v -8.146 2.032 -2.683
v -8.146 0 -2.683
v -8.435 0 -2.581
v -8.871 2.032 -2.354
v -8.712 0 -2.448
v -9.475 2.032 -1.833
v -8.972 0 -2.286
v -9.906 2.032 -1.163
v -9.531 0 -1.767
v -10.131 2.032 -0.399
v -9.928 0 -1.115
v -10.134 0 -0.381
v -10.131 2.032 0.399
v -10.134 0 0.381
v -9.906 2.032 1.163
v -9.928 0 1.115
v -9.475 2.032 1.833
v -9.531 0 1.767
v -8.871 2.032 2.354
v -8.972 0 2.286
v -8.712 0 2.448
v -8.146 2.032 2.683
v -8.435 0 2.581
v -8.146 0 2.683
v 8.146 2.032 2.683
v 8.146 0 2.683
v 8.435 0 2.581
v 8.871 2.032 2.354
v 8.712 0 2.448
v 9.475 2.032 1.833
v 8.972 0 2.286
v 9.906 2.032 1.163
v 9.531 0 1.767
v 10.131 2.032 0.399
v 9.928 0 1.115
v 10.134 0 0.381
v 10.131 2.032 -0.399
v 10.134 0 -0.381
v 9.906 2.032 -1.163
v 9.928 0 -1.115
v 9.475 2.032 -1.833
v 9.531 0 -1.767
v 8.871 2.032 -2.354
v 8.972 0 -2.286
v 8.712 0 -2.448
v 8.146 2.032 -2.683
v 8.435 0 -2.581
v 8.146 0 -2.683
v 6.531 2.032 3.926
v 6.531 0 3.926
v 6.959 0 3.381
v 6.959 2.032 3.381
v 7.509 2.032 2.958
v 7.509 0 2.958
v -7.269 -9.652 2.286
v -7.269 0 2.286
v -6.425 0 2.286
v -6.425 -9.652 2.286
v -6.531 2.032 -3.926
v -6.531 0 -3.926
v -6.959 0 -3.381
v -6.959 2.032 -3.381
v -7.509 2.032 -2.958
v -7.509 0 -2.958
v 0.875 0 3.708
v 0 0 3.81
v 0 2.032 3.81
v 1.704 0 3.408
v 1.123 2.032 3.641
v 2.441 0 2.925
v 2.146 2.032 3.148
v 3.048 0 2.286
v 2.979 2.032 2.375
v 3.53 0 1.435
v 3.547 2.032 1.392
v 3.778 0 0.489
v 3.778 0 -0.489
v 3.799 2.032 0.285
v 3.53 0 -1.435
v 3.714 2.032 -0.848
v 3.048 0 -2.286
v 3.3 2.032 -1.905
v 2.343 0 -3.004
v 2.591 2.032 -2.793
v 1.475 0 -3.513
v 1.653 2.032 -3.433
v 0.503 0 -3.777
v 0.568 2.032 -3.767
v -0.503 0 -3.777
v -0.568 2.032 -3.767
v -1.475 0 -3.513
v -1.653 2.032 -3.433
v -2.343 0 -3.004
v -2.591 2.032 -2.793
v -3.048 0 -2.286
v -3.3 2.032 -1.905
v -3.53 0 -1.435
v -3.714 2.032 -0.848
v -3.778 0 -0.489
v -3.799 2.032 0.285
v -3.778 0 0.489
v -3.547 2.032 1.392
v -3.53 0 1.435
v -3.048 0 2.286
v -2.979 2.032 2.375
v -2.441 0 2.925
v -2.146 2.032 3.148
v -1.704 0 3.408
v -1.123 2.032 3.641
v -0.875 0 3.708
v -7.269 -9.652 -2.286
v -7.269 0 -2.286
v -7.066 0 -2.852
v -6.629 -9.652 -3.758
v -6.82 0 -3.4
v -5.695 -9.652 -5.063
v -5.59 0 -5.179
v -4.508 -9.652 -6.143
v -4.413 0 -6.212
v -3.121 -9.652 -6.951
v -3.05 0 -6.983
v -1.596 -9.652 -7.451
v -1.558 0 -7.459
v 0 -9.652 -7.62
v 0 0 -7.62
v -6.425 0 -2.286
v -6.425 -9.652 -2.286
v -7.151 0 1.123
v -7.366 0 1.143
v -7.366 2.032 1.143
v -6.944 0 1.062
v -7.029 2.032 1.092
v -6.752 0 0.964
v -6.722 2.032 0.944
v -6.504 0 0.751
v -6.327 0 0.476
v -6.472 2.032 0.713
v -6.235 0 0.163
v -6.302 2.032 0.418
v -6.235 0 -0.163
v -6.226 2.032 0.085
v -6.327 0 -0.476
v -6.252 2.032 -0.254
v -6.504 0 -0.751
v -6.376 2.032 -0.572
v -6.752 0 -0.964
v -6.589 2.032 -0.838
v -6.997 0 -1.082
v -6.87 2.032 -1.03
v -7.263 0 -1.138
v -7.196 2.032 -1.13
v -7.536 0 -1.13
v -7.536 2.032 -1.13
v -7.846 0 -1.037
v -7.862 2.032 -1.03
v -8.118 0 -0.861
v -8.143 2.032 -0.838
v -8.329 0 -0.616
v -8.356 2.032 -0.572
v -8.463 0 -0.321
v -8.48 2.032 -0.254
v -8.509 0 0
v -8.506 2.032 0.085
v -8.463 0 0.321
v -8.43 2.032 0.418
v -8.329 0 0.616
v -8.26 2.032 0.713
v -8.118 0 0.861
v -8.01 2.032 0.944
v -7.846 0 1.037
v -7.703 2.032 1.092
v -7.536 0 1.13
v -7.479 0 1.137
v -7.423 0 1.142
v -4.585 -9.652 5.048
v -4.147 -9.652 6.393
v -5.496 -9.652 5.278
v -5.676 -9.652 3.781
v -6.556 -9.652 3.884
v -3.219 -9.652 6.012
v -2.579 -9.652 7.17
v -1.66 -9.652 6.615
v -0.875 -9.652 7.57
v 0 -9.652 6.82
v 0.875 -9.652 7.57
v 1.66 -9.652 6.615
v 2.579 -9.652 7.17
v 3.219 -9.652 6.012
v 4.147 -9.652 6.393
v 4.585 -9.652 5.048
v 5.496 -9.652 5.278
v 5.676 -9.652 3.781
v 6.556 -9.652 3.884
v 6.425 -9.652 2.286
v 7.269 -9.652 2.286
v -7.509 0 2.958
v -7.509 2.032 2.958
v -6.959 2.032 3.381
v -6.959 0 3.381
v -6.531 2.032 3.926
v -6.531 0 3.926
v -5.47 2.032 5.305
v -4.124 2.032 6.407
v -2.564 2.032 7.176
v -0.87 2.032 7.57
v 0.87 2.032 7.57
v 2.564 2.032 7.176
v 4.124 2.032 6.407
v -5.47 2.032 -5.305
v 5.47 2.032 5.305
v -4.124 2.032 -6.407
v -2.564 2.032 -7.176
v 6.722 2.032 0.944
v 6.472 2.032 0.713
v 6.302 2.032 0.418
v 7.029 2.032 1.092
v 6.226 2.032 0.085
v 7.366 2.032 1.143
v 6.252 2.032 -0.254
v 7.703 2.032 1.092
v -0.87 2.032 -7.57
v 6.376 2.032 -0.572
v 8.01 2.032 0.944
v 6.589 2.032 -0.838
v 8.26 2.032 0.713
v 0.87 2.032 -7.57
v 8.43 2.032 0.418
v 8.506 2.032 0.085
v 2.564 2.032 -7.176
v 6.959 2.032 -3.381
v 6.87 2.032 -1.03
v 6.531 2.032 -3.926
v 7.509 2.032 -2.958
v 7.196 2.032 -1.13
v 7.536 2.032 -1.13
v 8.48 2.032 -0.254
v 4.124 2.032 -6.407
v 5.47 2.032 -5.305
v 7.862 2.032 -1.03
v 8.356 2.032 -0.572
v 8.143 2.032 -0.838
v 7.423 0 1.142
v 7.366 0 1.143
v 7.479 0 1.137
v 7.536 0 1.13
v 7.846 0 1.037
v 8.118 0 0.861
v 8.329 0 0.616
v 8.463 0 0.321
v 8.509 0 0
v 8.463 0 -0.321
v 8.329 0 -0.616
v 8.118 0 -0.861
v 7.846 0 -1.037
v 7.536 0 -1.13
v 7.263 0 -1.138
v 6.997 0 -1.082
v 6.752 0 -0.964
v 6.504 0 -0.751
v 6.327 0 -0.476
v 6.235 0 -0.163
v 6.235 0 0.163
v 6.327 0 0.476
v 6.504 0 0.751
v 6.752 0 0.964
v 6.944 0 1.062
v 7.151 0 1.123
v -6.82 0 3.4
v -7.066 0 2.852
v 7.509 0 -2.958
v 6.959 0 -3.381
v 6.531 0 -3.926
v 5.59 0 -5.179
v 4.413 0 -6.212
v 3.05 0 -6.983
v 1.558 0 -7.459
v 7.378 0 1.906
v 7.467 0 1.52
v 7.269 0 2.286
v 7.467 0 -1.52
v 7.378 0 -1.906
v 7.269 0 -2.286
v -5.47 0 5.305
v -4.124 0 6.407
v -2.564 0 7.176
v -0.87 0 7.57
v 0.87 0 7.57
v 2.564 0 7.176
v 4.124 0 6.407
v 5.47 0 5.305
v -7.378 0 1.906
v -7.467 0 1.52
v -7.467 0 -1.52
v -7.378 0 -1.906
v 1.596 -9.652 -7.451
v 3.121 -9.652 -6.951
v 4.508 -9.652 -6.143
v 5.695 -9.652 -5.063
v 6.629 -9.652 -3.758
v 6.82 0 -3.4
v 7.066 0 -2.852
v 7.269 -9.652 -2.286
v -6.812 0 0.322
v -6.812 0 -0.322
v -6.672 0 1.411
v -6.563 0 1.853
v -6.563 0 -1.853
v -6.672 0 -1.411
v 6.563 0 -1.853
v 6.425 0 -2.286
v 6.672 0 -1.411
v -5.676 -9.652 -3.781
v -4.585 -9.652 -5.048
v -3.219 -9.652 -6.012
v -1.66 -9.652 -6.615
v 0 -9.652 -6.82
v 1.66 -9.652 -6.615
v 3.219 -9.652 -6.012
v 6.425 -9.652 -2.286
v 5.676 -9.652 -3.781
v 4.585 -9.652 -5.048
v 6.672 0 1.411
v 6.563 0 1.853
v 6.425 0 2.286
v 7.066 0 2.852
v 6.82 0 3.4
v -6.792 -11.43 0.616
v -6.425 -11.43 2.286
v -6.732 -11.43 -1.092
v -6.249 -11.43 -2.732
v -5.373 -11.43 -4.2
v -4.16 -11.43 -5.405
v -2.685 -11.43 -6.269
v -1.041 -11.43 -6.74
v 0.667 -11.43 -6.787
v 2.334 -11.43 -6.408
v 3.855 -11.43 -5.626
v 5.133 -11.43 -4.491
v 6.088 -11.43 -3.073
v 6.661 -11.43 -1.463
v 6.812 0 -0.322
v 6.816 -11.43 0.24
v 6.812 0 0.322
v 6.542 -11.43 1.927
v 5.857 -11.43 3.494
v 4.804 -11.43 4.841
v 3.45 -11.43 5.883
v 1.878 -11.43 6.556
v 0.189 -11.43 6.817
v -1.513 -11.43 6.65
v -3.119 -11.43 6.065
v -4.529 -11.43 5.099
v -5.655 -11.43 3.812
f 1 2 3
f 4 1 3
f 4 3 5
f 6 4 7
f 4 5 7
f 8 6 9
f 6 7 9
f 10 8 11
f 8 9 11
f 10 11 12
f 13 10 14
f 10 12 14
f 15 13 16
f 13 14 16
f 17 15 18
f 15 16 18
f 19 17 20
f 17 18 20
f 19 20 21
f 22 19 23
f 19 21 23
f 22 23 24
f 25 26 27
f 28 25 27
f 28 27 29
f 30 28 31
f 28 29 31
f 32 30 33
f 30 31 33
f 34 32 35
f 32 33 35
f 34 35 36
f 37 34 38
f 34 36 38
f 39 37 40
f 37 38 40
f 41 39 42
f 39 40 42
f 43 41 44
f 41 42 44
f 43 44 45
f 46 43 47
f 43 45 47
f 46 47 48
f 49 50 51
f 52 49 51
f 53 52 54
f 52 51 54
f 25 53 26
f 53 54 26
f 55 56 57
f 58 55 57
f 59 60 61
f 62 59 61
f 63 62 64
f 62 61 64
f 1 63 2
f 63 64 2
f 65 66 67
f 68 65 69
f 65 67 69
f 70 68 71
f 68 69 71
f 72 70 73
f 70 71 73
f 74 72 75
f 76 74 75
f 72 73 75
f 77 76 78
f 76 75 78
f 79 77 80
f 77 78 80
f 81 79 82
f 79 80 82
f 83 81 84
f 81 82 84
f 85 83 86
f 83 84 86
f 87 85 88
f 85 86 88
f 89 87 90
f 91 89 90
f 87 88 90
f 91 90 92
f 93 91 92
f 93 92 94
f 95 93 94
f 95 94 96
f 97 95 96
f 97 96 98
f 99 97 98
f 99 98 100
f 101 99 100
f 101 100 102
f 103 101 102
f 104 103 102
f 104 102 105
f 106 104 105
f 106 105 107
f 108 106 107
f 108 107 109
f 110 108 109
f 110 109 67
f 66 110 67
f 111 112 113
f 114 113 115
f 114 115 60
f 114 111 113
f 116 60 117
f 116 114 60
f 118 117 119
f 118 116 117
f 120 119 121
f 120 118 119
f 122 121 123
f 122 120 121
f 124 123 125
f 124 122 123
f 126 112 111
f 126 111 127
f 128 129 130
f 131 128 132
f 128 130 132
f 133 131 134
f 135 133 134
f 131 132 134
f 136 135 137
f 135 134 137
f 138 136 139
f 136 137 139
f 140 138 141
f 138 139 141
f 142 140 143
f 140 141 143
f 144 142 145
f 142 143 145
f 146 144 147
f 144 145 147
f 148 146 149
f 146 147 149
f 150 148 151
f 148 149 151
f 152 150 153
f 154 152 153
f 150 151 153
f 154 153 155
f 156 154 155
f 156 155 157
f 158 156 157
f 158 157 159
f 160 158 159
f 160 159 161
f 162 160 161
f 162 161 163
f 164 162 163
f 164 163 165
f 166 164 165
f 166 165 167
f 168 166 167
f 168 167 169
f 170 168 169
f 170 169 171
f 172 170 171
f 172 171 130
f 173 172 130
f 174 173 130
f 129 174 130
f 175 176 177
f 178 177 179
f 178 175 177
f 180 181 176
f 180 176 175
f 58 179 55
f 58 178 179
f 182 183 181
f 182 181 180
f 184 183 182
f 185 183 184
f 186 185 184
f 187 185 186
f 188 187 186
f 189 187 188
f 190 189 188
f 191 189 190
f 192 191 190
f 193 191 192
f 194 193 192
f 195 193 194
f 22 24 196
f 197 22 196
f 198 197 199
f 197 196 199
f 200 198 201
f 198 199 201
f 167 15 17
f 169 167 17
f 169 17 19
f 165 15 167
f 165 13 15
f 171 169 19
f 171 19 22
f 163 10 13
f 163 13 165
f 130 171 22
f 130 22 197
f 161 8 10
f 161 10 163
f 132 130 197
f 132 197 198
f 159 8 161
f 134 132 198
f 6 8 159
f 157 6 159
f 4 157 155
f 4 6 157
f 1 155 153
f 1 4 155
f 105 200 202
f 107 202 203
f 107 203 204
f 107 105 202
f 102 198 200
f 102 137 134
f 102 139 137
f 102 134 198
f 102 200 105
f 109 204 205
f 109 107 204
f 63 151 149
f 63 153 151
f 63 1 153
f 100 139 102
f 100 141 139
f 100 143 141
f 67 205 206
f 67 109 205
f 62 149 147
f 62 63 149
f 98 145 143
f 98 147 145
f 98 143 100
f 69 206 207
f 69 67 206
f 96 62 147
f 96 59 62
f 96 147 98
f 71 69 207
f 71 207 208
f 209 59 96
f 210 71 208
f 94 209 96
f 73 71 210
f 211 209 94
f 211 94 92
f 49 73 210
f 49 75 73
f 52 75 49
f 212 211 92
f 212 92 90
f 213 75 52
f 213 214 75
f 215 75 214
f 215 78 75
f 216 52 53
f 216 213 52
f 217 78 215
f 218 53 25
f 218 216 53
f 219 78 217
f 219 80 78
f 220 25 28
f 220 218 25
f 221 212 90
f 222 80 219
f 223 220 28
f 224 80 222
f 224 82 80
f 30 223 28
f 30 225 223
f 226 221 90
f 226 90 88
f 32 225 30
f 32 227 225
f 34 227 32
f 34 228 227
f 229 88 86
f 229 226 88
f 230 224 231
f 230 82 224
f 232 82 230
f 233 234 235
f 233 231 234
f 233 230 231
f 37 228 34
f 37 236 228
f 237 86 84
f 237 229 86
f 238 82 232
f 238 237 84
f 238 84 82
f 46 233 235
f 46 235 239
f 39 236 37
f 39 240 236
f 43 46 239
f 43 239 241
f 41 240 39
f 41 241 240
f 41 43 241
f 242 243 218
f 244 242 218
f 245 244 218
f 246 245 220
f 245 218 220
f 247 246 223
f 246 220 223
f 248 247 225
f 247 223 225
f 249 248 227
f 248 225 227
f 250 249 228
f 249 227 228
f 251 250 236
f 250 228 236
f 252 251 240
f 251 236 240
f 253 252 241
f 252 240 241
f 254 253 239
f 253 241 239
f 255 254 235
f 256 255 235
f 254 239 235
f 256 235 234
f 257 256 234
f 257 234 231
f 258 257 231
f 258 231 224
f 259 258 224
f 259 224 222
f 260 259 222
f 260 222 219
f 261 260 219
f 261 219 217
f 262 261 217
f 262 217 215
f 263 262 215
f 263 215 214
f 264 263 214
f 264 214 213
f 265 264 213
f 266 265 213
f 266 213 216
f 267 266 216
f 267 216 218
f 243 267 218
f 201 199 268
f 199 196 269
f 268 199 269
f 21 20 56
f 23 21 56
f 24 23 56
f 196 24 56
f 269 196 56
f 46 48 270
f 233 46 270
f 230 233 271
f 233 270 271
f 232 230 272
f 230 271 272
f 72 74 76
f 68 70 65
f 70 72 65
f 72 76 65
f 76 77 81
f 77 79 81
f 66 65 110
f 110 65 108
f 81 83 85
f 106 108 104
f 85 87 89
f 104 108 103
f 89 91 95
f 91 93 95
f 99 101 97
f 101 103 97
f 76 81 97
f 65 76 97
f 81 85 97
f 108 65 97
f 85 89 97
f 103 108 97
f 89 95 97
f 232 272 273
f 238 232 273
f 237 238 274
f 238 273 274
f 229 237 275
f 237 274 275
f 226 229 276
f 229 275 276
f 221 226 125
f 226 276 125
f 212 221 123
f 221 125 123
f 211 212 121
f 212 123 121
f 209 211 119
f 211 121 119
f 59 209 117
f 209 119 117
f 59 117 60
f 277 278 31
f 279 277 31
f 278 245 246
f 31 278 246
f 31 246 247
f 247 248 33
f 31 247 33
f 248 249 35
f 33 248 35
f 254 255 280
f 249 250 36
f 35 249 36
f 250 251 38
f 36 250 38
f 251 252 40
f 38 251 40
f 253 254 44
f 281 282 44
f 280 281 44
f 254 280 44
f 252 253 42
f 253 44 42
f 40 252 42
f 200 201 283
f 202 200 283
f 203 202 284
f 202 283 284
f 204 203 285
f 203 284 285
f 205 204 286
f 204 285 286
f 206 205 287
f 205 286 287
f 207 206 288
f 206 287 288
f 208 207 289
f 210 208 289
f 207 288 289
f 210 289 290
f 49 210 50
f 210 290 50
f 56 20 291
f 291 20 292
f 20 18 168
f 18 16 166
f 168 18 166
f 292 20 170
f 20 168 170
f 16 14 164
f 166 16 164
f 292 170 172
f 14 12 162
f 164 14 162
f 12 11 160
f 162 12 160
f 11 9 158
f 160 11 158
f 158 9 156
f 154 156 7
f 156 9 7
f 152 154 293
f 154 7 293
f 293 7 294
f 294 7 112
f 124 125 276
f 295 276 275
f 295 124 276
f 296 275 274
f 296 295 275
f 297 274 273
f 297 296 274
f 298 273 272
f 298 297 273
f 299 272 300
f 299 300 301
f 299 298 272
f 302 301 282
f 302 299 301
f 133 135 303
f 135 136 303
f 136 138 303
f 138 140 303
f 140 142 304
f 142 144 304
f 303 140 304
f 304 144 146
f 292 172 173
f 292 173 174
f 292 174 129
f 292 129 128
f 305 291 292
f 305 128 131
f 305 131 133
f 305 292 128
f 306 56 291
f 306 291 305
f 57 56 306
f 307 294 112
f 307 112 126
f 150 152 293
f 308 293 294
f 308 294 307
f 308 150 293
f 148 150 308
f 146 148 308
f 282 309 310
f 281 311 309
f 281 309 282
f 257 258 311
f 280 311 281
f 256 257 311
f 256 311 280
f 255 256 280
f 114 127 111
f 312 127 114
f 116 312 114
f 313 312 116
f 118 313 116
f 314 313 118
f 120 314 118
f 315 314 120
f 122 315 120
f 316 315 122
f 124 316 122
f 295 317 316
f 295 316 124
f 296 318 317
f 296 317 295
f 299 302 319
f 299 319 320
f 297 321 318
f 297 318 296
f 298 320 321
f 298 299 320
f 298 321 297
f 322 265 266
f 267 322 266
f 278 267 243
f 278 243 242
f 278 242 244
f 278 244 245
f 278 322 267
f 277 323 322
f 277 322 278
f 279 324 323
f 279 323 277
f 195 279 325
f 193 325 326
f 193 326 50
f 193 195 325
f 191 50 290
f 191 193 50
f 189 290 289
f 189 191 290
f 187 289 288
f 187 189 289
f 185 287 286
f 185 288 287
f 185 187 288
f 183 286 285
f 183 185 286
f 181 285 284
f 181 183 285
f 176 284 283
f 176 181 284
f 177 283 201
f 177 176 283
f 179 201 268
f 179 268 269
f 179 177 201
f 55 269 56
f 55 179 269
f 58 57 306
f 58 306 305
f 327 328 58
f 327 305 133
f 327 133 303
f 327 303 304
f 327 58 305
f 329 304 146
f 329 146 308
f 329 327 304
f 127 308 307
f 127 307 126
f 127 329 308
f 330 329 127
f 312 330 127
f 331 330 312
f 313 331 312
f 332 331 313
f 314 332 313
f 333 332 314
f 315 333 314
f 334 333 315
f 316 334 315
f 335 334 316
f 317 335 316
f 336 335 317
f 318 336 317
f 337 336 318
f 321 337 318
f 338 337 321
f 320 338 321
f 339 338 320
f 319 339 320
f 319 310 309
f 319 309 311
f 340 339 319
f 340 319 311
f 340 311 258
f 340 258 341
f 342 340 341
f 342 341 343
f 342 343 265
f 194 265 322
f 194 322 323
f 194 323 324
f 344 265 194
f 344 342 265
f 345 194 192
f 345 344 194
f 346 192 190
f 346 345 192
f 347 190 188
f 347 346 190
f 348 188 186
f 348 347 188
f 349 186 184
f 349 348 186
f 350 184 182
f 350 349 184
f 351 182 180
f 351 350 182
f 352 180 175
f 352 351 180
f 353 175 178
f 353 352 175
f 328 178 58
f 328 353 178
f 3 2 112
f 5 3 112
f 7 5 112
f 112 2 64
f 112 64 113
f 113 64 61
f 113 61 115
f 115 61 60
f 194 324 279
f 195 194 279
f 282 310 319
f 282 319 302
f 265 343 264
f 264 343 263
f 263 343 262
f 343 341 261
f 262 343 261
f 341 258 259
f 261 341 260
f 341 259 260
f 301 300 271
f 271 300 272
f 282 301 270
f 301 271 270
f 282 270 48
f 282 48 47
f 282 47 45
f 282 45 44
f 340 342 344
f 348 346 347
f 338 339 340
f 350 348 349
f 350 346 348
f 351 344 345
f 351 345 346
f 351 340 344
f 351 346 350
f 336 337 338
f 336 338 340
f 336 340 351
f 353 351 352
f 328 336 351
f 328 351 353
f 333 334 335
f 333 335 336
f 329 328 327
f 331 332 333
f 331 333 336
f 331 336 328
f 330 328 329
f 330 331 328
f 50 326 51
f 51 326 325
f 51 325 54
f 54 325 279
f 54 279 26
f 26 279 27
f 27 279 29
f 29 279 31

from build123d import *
from build123d.topology import SkipClean

# Parameters (mm, degrees)
BOSS_EXTRUDE1_DEPTH = 2.032
SKETCH2_R           = 3.81
SKETCH2_R_2         = 1.143
CUT_EXTRUDE1_DEPTH  = 13.861532724
BOSS_EXTRUDE2_START = 9.652
SKETCH3_R           = 7.62
SKETCH3_R_2         = 6.82
BOSS_EXTRUDE2_DEPTH = 9.652
SKETCH4_W           = 25.828848912
SKETCH4_H           = 4.572
CUT_EXTRUDE2_DEPTH  = 16.951523564
BOSS_EXTRUDE3_START = 11.43
SKETCH5_R           = 6.82
BOSS_EXTRUDE3_DEPTH = 11.43


with BuildPart() as part:
    # Sketch1 → Boss-Extrude1 (new body)
    with BuildSketch(Plane(origin=(0, 0, 0), x_dir=(1, 0, 0), z_dir=(0, 1, 0))):
        with BuildLine():
            ThreePointArc((-6.530513036, -3.926423243), (0, -7.62), (6.530513036, -3.926423243))
            ThreePointArc((6.530513036, -3.926423243), (7.220592933, -3.152220394), (8.145517241, -2.683055883))
            ThreePointArc((8.145517241, -2.683055883), (10.16, 0), (8.145517241, 2.683055883))
            ThreePointArc((8.145517241, 2.683055883), (7.220592933, 3.152220394), (6.530513036, 3.926423243))
            ThreePointArc((6.530513036, 3.926423243), (0, 7.62), (-6.530513036, 3.926423243))
            ThreePointArc((-6.530513036, 3.926423243), (-7.220592933, 3.152220394), (-8.145517241, 2.683055883))
            ThreePointArc((-8.145517241, 2.683055883), (-10.16, 0), (-8.145517241, -2.683055883))
            ThreePointArc((-8.145517241, -2.683055883), (-7.220592933, -3.152220394), (-6.530513036, -3.926423243))
        make_face()
    extrude(amount=BOSS_EXTRUDE1_DEPTH)

    # Sketch2 → Cut-Extrude1 (cut, through all)
    with BuildSketch(Plane(origin=(0, 2.032, 0), x_dir=(1, 0, 0), z_dir=(0, 1, 0))):
        with Locations(Location((0, 0, 0), (0, 0, 270))):
            Circle(SKETCH2_R)
        with Locations(Location((-7.366, 0, 0), (0, 0, 270))):
            Circle(SKETCH2_R_2)
        with Locations(Location((7.366, 0, 0), (0, 0, 270))):
            Circle(SKETCH2_R_2)
    extrude(amount=-CUT_EXTRUDE1_DEPTH, mode=Mode.SUBTRACT)

    # Sketch3 → Boss-Extrude2 (add)
    with SkipClean():  # the faces are left unmerged after this step: merging them gives an invalid solid
        with BuildSketch(Plane.XZ.offset(BOSS_EXTRUDE2_START)):
            with Locations(Location((0, 0, 0), (0, 0, 270))):
                Circle(SKETCH3_R)
            with Locations(Location((0, 0, 0), (0, 0, 171.875802718))):
                Circle(SKETCH3_R_2, mode=Mode.SUBTRACT)
        extrude(amount=-BOSS_EXTRUDE2_DEPTH)

    # Sketch4 → Cut-Extrude2 (cut, through all)
    with SkipClean():  # the faces are left unmerged after this step: merging them gives an invalid solid
        with BuildSketch(Plane.XZ):
            Rectangle(SKETCH4_W, SKETCH4_H)
        extrude(amount=CUT_EXTRUDE2_DEPTH, mode=Mode.SUBTRACT)

    # Sketch5 → Boss-Extrude3 (add)
    with SkipClean():  # the faces are left unmerged after this step: merging them gives an invalid solid
        with BuildSketch(Plane.XZ.offset(BOSS_EXTRUDE3_START)):
            with Locations(Location((0, 0, 0), (0, 0, 160.415870392))):
                Circle(SKETCH5_R)
        extrude(amount=-BOSS_EXTRUDE3_DEPTH)


solid = part.part
